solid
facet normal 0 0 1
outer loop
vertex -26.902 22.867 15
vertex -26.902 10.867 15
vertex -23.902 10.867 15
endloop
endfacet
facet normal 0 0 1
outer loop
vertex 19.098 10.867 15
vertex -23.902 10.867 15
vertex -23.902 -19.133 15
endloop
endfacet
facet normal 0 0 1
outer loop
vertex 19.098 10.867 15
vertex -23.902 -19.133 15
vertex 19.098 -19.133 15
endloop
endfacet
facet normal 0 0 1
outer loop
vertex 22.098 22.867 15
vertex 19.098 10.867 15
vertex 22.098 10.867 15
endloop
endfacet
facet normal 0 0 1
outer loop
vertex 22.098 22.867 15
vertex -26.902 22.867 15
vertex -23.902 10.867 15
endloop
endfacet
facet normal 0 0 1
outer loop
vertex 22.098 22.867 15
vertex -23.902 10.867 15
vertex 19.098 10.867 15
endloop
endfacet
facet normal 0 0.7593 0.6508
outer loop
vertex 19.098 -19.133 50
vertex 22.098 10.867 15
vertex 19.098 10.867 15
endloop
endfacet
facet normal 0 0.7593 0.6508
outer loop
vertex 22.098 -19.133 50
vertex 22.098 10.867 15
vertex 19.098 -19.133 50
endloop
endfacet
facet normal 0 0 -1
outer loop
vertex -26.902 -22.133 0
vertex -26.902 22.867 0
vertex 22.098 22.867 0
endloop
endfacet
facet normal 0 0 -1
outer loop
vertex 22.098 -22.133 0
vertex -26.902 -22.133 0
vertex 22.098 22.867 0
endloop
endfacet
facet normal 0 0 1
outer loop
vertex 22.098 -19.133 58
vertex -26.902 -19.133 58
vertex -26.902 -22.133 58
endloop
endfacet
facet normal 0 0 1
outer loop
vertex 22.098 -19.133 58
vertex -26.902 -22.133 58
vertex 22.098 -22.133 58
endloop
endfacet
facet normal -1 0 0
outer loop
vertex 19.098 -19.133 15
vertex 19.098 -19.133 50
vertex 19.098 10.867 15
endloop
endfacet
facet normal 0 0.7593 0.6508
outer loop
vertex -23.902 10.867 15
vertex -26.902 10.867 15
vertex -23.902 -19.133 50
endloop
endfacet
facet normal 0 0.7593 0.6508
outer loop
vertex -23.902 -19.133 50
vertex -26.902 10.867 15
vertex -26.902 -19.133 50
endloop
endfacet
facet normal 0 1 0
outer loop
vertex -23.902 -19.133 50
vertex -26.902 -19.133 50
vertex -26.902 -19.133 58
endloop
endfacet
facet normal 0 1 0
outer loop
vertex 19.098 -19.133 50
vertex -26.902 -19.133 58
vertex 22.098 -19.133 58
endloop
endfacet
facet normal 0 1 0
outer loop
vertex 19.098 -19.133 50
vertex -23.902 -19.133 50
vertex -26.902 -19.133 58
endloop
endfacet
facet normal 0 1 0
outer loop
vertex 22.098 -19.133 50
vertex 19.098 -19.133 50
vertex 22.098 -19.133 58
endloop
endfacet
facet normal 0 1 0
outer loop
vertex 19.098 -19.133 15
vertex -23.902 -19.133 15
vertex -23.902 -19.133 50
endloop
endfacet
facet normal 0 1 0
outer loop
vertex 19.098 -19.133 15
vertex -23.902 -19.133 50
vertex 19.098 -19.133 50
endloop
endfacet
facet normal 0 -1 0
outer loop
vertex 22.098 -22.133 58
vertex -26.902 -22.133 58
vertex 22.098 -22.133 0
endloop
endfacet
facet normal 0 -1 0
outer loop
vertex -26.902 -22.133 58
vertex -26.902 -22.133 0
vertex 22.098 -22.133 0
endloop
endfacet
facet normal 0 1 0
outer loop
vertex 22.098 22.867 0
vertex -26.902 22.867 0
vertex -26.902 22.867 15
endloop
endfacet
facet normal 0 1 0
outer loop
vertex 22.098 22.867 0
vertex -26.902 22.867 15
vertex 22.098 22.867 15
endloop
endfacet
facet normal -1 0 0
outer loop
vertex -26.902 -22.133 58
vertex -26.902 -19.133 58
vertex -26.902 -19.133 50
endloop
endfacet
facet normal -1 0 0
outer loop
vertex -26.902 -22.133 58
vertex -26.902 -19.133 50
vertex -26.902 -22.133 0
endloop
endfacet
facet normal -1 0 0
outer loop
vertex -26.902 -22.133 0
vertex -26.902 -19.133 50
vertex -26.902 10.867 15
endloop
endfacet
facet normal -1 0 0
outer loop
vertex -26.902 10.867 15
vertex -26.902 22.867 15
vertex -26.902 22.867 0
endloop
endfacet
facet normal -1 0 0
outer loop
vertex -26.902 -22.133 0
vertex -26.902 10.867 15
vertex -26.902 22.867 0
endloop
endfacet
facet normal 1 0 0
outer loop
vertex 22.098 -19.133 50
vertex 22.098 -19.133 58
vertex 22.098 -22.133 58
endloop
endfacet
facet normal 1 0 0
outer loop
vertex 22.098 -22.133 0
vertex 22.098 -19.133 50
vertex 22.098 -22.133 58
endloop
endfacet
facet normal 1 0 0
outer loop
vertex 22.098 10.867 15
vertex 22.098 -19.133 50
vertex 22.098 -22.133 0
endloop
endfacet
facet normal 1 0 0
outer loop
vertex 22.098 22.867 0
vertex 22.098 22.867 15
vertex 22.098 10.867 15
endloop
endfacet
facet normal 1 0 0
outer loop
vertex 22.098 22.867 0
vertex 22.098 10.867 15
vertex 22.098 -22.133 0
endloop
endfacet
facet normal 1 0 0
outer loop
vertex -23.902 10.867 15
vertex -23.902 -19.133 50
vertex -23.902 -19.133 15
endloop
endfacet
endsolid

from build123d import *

# Parameters (mm, degrees)
SKETCH1_W           = 49
SKETCH1_H           = 45
BOSS_EXTRUDE1_DEPTH = 15
SKETCH2_W           = 49
SKETCH2_H           = 3
BOSS_EXTRUDE2_DEPTH = 43
BOSS_EXTRUDE3_DEPTH = 3
BOSS_EXTRUDE4_DEPTH = 3


with BuildPart() as part:
    # Sketch1 → Boss-Extrude1 (new body)
    with BuildSketch(Plane.XY):
        with Locations((-2.402173913, 0.366847826)):
            Rectangle(SKETCH1_W, SKETCH1_H)
    extrude(amount=BOSS_EXTRUDE1_DEPTH)

    # Sketch2 → Boss-Extrude2 (add)
    with BuildSketch(Plane.XY.offset(15)):
        with Locations((-2.402173913, -20.633152174)):
            Rectangle(SKETCH2_W, SKETCH2_H)
    extrude(amount=BOSS_EXTRUDE2_DEPTH)

    # Sketch4 → Boss-Extrude3 (add)
    with BuildSketch(Plane.ZY.offset(26.902173913)):
        Polygon((15, -19.133152174), (15, 10.866847826), (50, -19.133152174), align=None)
    extrude(amount=-BOSS_EXTRUDE3_DEPTH)

    # Sketch5 → Boss-Extrude4 (add)
    with BuildSketch(Plane(origin=(22.097826087, 0, 0), x_dir=(0, 0, -1), z_dir=(1, 0, 0))):
        Polygon((-15, -19.133152174), (-15, 10.866847826), (-50, -19.133152174), align=None)
    extrude(amount=-BOSS_EXTRUDE4_DEPTH)


solid = part.part
